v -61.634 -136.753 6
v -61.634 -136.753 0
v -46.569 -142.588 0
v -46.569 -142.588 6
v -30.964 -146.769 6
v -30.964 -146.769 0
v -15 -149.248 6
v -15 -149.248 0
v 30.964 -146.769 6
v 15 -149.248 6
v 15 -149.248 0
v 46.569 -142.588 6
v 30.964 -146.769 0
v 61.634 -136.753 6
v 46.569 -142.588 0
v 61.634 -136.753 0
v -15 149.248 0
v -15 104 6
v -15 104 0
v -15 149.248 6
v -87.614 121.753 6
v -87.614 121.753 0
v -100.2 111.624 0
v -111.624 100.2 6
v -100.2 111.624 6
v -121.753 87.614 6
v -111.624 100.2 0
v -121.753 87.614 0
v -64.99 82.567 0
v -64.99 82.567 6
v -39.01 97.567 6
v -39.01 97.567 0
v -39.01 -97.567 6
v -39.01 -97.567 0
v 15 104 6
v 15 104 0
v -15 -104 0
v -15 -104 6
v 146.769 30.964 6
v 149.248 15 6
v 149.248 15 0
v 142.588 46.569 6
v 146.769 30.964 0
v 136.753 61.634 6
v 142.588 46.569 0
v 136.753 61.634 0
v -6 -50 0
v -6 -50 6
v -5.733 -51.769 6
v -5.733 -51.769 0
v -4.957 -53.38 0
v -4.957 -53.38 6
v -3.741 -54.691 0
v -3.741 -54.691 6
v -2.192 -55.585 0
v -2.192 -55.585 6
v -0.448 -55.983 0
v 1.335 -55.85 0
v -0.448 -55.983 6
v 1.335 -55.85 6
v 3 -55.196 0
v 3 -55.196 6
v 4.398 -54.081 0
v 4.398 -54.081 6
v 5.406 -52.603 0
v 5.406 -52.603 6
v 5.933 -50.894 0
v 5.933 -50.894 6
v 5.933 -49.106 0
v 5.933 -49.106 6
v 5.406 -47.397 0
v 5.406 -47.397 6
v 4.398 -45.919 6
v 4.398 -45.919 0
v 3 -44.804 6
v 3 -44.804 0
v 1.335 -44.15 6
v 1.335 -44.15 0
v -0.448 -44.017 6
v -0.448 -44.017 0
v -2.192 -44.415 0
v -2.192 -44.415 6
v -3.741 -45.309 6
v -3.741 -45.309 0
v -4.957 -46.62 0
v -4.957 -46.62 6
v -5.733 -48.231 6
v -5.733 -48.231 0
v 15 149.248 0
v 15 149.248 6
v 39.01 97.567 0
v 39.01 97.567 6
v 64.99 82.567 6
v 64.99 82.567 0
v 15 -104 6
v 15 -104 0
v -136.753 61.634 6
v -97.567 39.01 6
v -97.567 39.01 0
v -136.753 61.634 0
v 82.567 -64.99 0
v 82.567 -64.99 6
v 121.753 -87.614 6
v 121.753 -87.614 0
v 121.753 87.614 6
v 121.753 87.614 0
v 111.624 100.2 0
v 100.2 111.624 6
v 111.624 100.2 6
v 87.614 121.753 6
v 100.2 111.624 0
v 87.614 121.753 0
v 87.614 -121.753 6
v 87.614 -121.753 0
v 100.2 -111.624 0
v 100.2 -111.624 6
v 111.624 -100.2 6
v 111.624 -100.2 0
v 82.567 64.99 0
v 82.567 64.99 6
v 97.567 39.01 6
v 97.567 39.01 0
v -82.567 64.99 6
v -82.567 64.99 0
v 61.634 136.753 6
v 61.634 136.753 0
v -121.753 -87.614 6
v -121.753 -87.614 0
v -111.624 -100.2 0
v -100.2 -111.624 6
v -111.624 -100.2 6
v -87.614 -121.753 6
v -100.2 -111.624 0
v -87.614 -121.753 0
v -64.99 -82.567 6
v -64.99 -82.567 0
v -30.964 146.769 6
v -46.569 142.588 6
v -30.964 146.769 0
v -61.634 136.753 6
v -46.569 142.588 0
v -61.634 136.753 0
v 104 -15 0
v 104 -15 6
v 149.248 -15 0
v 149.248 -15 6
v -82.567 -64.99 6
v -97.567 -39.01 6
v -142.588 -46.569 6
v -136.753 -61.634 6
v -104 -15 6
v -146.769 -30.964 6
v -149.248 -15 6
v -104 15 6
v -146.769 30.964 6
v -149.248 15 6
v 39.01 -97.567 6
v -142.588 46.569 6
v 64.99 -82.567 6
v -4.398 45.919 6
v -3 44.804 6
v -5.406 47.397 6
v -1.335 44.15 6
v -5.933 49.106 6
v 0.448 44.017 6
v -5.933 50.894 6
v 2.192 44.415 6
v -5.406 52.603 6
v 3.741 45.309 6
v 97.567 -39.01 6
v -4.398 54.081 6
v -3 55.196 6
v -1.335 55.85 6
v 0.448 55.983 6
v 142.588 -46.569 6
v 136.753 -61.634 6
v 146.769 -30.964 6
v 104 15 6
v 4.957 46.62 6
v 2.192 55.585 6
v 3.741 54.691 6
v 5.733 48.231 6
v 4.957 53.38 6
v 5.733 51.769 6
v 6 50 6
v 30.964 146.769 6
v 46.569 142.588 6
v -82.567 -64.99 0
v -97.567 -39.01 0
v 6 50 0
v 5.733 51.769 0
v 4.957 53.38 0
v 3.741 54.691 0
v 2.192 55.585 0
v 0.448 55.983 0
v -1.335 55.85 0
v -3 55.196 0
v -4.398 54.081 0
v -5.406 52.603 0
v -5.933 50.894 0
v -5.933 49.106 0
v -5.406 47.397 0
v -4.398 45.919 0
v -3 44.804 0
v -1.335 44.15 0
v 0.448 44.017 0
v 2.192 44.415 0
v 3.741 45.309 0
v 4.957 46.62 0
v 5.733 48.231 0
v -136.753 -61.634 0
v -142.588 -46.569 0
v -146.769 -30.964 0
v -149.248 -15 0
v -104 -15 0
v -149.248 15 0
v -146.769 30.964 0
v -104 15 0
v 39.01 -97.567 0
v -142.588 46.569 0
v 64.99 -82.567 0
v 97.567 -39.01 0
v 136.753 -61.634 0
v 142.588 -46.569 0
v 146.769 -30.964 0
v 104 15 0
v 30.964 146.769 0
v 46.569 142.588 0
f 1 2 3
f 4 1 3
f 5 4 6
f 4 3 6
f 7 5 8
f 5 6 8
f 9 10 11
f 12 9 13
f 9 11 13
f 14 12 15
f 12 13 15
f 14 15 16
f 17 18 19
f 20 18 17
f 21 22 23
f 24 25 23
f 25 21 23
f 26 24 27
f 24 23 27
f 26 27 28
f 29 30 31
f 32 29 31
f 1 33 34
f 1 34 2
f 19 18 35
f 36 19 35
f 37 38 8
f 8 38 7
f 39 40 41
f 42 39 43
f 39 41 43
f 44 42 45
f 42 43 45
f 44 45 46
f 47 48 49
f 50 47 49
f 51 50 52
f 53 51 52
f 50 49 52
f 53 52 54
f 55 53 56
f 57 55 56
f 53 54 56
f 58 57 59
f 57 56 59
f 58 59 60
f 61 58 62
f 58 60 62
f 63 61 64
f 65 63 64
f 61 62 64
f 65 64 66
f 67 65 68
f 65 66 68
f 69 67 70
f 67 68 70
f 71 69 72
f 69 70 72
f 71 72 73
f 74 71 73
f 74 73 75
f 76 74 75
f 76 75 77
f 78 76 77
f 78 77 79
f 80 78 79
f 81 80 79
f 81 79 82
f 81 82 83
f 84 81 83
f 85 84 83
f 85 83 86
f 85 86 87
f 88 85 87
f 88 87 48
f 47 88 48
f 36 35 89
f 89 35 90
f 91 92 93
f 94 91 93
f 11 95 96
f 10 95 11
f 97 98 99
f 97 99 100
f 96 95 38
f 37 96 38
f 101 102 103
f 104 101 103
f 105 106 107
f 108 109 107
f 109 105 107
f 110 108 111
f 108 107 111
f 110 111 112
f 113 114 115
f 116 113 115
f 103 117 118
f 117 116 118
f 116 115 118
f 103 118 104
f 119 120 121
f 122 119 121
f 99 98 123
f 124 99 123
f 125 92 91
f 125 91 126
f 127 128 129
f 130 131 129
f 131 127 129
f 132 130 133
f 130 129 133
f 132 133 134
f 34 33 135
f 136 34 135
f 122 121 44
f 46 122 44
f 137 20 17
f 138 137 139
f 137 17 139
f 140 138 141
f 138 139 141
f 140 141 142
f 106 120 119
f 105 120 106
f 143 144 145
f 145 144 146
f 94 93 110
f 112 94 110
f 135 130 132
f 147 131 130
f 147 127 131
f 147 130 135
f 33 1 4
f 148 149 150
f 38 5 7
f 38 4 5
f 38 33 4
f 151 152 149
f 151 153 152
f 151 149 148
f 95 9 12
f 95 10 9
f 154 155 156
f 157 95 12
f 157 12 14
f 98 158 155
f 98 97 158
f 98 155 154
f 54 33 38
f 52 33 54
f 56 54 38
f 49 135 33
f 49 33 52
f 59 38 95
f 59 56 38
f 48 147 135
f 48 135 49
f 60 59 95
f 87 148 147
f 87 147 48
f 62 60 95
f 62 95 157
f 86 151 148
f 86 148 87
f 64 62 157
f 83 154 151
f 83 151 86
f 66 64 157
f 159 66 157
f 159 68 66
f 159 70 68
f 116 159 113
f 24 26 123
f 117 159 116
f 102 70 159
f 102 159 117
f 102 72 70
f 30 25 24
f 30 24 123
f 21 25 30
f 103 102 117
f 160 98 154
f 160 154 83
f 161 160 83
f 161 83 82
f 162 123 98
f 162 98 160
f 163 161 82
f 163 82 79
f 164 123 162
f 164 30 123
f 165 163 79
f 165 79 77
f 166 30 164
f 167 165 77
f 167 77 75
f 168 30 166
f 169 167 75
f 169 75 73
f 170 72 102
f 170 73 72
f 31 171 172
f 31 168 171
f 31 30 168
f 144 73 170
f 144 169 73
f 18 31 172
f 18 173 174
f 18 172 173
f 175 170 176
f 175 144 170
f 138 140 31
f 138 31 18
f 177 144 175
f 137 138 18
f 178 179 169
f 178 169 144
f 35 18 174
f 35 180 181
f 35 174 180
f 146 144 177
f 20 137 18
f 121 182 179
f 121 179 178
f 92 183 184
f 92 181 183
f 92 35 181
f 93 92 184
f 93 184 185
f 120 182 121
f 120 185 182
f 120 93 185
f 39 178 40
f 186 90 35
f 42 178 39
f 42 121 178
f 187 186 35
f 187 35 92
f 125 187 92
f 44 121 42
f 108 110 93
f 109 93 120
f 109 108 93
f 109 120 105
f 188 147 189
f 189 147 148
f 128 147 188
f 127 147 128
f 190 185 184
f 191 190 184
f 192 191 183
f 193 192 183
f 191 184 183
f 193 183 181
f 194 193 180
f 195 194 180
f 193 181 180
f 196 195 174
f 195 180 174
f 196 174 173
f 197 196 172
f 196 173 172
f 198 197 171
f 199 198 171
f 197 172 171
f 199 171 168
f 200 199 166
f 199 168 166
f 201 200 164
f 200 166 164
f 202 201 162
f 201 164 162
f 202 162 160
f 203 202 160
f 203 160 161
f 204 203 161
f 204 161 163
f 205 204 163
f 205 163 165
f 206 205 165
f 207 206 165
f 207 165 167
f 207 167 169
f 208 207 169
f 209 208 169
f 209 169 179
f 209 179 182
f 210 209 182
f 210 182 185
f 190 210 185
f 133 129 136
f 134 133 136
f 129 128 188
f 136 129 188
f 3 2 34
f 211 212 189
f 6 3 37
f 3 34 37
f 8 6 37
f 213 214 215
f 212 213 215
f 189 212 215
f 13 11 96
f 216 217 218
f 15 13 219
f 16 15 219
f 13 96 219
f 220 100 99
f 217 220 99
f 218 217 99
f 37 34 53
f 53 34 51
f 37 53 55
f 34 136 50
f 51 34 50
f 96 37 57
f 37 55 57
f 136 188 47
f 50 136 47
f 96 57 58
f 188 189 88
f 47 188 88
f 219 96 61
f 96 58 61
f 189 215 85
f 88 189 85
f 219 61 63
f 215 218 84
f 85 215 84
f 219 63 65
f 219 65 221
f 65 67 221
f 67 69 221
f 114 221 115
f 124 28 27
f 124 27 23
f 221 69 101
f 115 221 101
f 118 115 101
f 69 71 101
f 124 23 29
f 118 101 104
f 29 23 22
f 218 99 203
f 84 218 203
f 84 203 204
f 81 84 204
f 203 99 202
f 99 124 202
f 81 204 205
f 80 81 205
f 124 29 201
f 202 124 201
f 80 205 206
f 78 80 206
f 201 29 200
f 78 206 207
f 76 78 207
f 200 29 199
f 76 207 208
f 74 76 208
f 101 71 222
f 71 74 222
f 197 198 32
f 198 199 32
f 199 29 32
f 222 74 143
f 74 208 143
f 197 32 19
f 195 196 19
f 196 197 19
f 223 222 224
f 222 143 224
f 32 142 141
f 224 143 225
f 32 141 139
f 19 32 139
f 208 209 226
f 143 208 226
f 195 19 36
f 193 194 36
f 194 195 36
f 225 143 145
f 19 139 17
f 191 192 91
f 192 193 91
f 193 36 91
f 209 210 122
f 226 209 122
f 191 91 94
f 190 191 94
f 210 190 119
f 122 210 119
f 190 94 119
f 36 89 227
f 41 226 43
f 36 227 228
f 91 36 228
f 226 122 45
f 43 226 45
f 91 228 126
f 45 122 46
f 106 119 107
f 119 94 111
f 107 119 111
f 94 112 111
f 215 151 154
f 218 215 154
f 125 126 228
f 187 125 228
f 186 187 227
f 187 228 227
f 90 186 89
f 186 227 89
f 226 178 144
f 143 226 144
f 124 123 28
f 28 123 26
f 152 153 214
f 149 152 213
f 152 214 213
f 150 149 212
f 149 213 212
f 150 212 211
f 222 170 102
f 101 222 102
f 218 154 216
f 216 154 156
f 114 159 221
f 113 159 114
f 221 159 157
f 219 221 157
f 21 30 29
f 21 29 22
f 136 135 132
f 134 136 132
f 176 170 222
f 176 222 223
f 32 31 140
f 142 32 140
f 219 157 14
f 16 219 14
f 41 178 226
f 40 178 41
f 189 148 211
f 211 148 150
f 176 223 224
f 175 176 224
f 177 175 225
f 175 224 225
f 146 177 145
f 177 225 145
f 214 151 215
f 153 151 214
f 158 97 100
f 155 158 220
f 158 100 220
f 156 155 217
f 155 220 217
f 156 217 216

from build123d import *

# Parameters (mm, degrees)
SKETCH_R              = 150
PAD_DEPTH             = 6
SKETCH001_R           = 6
POCKET_DEPTH          = 854.613986
SKETCH002_W           = 30
SKETCH002_H           = 46
POCKET001_DEPTH       = 854.613986
POLARPATTERN_COUNT    = 12
POLARPATTERN001_COUNT = 2


with BuildPart() as part:
    # Sketch → Pad (new body)
    with BuildSketch(Plane.XY):
        Circle(SKETCH_R)
    extrude(amount=PAD_DEPTH)

    # Sketch001 (on Face3 of Pad) → Pocket (cut, through all)
    with BuildSketch(Plane.XY.offset(6)):
        with Locations((0, 50)):
            Circle(SKETCH001_R)
    pocket = extrude(amount=-POCKET_DEPTH, mode=Mode.SUBTRACT)

    # Sketch002 (on Face3 of Pocket) → Pocket001 (cut, through all)
    with BuildSketch(Plane.XY.offset(6)):
        with Locations((0, 127)):
            Rectangle(SKETCH002_W, SKETCH002_H)
    pocket001 = extrude(amount=-POCKET001_DEPTH, mode=Mode.SUBTRACT)

    # PolarPattern: Pocket001 ×12 about axis
    polarpattern_axis = Axis((0, 0, 6), (0, 0, 1))
    for i in range(1, POLARPATTERN_COUNT):
        add(pocket001.rotate(polarpattern_axis, i * 360 / POLARPATTERN_COUNT), mode=Mode.SUBTRACT)

    # PolarPattern001: Pocket ×2 about axis
    polarpattern001_axis = Axis((0, 0, 6), (0, 0, 1))
    for i in range(1, POLARPATTERN001_COUNT):
        add(pocket.rotate(polarpattern001_axis, i * 360 / POLARPATTERN001_COUNT), mode=Mode.SUBTRACT)


solid = part.part
